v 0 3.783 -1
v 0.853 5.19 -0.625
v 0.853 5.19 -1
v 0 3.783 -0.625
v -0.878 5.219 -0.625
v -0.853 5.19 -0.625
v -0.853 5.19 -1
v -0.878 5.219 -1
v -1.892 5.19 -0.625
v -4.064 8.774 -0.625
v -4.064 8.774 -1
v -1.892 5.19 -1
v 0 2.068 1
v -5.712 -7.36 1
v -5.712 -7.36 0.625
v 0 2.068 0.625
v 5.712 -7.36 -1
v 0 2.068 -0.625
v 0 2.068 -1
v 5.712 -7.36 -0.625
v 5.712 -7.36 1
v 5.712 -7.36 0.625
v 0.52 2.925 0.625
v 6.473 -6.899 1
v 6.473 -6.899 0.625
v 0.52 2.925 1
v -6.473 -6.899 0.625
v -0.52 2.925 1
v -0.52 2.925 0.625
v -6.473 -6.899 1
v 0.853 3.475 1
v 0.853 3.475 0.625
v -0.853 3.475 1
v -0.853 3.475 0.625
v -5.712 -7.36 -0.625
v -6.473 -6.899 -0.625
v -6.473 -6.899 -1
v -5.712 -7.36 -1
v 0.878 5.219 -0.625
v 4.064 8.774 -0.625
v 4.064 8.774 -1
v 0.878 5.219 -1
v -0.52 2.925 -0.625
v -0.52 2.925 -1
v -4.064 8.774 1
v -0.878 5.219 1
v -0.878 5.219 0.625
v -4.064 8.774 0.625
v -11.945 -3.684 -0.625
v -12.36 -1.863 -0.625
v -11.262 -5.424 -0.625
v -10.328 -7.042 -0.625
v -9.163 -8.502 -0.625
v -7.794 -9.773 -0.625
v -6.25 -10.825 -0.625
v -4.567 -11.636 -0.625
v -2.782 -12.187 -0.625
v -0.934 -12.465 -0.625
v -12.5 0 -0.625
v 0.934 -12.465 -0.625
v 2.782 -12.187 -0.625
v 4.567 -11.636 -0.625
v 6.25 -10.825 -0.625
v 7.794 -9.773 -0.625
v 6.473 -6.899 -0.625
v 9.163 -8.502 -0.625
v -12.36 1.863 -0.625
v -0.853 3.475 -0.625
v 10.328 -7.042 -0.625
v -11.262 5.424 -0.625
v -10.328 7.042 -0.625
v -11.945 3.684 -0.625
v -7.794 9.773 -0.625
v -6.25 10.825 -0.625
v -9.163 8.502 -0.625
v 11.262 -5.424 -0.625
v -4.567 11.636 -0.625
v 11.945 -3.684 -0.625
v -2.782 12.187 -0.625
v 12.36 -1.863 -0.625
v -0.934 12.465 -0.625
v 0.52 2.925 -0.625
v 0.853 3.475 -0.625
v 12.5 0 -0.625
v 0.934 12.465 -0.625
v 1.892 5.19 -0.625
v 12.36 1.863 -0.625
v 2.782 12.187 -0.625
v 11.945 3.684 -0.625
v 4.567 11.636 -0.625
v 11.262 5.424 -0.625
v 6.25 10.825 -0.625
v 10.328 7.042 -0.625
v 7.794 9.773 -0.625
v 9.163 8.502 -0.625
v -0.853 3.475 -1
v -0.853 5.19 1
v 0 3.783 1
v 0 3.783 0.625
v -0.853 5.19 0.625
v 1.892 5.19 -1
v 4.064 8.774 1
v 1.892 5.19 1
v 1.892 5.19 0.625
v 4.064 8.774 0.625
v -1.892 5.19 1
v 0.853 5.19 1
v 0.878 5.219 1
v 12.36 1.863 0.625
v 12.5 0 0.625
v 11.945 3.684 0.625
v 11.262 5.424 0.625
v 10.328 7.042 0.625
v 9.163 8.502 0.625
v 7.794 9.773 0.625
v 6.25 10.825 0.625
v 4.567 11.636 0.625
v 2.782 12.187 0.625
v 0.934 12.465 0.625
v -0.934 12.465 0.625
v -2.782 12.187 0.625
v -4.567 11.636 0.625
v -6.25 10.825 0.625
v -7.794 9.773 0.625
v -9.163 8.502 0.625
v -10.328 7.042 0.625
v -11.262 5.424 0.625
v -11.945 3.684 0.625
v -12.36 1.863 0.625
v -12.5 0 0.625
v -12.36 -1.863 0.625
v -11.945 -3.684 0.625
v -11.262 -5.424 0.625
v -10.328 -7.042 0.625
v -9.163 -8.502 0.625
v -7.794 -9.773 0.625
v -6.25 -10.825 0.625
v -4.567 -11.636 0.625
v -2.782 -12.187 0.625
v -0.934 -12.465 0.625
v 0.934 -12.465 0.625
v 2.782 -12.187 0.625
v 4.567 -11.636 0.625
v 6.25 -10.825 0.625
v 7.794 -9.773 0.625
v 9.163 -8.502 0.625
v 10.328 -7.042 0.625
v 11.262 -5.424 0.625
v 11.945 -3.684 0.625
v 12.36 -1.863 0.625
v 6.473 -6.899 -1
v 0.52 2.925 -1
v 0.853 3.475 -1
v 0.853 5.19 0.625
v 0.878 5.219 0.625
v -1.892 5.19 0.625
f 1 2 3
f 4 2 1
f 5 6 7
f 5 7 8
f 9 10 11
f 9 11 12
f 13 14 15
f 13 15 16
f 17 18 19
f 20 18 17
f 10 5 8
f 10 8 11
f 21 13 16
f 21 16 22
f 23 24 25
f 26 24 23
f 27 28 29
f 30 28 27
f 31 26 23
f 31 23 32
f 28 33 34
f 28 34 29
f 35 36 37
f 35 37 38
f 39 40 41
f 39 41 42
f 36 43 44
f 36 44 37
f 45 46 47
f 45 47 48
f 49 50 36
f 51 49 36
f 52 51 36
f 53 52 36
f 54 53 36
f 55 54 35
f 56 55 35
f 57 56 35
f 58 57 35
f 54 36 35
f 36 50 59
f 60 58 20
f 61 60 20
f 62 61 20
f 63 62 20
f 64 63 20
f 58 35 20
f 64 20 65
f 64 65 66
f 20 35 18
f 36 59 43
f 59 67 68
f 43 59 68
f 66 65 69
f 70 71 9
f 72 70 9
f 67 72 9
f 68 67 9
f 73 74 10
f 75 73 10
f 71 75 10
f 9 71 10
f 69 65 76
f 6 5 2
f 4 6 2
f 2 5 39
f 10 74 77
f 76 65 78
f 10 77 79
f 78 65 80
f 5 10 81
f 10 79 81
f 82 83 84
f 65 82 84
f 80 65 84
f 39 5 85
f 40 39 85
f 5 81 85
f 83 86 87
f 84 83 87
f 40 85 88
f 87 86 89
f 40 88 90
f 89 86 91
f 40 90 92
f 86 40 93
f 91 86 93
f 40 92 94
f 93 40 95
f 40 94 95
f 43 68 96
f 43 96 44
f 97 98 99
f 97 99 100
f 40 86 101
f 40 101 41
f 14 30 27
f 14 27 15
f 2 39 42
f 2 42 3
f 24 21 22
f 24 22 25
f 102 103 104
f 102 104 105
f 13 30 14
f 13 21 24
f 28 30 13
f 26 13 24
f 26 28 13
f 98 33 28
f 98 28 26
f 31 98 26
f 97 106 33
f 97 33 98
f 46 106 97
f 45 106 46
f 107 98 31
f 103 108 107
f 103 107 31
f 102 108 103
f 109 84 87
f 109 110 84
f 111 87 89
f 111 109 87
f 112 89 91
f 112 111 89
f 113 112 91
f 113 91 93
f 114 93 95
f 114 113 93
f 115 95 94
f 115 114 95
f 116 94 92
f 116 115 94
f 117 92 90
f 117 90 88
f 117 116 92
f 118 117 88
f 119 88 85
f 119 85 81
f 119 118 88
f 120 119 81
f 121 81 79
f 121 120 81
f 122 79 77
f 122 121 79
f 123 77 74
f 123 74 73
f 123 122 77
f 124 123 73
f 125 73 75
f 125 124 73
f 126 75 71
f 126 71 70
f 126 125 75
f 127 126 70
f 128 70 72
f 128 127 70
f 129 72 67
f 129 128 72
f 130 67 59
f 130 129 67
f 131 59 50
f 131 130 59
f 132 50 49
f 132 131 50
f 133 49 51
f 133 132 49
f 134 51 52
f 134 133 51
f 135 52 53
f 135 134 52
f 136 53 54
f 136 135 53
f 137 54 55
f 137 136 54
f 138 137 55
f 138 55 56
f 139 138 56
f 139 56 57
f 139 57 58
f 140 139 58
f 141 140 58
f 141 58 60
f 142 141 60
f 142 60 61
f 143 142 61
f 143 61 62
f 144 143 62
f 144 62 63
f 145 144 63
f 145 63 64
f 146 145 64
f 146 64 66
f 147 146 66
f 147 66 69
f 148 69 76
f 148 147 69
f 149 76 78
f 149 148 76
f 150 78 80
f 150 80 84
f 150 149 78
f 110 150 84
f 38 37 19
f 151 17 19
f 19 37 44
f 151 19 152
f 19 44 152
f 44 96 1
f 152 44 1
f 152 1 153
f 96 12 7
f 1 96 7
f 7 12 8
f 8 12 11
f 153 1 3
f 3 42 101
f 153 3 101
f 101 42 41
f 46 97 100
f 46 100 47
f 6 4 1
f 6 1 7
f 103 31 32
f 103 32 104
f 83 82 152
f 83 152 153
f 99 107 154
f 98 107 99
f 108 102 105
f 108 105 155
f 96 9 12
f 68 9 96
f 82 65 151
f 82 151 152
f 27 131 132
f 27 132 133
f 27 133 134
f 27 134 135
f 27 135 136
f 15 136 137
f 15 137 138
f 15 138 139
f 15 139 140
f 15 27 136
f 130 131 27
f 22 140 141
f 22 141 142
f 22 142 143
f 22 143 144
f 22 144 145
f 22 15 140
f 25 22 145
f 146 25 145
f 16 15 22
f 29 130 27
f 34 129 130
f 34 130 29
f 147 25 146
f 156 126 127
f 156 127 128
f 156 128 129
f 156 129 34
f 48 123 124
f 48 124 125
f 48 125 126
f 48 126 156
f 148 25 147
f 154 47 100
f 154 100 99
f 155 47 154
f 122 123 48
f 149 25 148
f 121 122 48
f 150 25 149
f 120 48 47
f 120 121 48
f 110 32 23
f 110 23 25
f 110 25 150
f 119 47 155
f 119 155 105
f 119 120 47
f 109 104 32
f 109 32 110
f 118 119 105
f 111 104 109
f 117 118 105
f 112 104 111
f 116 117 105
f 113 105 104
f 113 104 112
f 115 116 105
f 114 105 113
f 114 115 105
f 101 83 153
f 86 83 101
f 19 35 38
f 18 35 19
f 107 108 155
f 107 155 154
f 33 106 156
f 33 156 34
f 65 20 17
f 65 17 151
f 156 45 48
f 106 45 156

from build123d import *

# Parameters (mm, degrees)
F0_R     = 12.5
F1_DEPTH = 0.625
F2_DEPTH = 1


with BuildPart() as f1:
    # F0 (on Top) → F1 (new body, symmetric)
    with BuildSketch(Plane.XY):
        Circle(F0_R)
        Polygon((-0.8784600757, 5.2192566285), (-0.8525428319, 5.1903319625), (0, 3.7833468732), (0.8525428319, 5.1903319625), (0.8784600757, 5.2192566285), (4.0636942722, 8.7741035968), (1.8921582399, 5.1903319625), (0.8525428319, 3.4746136163), (0.519807704, 2.9254877001), (6.4726816234, -6.8987751159), (5.7122610048, -7.3595412979), (0, 2.0676285271), (-5.7122610048, -7.3595412979), (-6.4726816234, -6.8987751159), (-0.519807704, 2.9254877001), (-0.8525428319, 3.4746136163), (-1.8921582399, 5.1903319625), (-4.0636942722, 8.7741035968), align=None, mode=Mode.SUBTRACT)
    extrude(amount=F1_DEPTH, both=True)

    # F0 (on Top) → F2 (join, symmetric)
    with BuildSketch(Plane.XY):
        Polygon((0, 3.7833468732), (-0.8525428319, 5.1903319625), (-0.8784600757, 5.2192566285), (-0.869668365, 5.1903319625), (-1.8921582399, 5.1903319625), (-0.8525428319, 3.4746136163), (-0.519807704, 2.9254877001), align=None)
        Polygon((0.8525428319, 5.1903319625), (0, 3.7833468732), (0.519807704, 2.9254877001), (0.8525428319, 3.4746136163), (1.8921582399, 5.1903319625), (0.869668365, 5.1903319625), (0.8784600757, 5.2192566285), align=None)
        Polygon((4.0636942722, 8.7741035968), (0.8784600757, 5.2192566285), (0.869668365, 5.1903319625), (1.8921582399, 5.1903319625), align=None)
        Polygon((-0.869668365, 5.1903319625), (-0.8784600757, 5.2192566285), (-4.0636942722, 8.7741035968), (-1.8921582399, 5.1903319625), align=None)
        Polygon((0.519807704, 2.9254877001), (0, 3.7833468732), (-0.519807704, 2.9254877001), (0, 2.0676285271), align=None)
        Polygon((0, 2.0676285271), (-0.519807704, 2.9254877001), (-6.4726816234, -6.8987751159), (-5.7122610048, -7.3595412979), align=None)
        Polygon((6.4726816234, -6.8987751159), (0.519807704, 2.9254877001), (0, 2.0676285271), (5.7122610048, -7.3595412979), align=None)
    extrude(amount=F2_DEPTH, both=True)


solid = f1.part
